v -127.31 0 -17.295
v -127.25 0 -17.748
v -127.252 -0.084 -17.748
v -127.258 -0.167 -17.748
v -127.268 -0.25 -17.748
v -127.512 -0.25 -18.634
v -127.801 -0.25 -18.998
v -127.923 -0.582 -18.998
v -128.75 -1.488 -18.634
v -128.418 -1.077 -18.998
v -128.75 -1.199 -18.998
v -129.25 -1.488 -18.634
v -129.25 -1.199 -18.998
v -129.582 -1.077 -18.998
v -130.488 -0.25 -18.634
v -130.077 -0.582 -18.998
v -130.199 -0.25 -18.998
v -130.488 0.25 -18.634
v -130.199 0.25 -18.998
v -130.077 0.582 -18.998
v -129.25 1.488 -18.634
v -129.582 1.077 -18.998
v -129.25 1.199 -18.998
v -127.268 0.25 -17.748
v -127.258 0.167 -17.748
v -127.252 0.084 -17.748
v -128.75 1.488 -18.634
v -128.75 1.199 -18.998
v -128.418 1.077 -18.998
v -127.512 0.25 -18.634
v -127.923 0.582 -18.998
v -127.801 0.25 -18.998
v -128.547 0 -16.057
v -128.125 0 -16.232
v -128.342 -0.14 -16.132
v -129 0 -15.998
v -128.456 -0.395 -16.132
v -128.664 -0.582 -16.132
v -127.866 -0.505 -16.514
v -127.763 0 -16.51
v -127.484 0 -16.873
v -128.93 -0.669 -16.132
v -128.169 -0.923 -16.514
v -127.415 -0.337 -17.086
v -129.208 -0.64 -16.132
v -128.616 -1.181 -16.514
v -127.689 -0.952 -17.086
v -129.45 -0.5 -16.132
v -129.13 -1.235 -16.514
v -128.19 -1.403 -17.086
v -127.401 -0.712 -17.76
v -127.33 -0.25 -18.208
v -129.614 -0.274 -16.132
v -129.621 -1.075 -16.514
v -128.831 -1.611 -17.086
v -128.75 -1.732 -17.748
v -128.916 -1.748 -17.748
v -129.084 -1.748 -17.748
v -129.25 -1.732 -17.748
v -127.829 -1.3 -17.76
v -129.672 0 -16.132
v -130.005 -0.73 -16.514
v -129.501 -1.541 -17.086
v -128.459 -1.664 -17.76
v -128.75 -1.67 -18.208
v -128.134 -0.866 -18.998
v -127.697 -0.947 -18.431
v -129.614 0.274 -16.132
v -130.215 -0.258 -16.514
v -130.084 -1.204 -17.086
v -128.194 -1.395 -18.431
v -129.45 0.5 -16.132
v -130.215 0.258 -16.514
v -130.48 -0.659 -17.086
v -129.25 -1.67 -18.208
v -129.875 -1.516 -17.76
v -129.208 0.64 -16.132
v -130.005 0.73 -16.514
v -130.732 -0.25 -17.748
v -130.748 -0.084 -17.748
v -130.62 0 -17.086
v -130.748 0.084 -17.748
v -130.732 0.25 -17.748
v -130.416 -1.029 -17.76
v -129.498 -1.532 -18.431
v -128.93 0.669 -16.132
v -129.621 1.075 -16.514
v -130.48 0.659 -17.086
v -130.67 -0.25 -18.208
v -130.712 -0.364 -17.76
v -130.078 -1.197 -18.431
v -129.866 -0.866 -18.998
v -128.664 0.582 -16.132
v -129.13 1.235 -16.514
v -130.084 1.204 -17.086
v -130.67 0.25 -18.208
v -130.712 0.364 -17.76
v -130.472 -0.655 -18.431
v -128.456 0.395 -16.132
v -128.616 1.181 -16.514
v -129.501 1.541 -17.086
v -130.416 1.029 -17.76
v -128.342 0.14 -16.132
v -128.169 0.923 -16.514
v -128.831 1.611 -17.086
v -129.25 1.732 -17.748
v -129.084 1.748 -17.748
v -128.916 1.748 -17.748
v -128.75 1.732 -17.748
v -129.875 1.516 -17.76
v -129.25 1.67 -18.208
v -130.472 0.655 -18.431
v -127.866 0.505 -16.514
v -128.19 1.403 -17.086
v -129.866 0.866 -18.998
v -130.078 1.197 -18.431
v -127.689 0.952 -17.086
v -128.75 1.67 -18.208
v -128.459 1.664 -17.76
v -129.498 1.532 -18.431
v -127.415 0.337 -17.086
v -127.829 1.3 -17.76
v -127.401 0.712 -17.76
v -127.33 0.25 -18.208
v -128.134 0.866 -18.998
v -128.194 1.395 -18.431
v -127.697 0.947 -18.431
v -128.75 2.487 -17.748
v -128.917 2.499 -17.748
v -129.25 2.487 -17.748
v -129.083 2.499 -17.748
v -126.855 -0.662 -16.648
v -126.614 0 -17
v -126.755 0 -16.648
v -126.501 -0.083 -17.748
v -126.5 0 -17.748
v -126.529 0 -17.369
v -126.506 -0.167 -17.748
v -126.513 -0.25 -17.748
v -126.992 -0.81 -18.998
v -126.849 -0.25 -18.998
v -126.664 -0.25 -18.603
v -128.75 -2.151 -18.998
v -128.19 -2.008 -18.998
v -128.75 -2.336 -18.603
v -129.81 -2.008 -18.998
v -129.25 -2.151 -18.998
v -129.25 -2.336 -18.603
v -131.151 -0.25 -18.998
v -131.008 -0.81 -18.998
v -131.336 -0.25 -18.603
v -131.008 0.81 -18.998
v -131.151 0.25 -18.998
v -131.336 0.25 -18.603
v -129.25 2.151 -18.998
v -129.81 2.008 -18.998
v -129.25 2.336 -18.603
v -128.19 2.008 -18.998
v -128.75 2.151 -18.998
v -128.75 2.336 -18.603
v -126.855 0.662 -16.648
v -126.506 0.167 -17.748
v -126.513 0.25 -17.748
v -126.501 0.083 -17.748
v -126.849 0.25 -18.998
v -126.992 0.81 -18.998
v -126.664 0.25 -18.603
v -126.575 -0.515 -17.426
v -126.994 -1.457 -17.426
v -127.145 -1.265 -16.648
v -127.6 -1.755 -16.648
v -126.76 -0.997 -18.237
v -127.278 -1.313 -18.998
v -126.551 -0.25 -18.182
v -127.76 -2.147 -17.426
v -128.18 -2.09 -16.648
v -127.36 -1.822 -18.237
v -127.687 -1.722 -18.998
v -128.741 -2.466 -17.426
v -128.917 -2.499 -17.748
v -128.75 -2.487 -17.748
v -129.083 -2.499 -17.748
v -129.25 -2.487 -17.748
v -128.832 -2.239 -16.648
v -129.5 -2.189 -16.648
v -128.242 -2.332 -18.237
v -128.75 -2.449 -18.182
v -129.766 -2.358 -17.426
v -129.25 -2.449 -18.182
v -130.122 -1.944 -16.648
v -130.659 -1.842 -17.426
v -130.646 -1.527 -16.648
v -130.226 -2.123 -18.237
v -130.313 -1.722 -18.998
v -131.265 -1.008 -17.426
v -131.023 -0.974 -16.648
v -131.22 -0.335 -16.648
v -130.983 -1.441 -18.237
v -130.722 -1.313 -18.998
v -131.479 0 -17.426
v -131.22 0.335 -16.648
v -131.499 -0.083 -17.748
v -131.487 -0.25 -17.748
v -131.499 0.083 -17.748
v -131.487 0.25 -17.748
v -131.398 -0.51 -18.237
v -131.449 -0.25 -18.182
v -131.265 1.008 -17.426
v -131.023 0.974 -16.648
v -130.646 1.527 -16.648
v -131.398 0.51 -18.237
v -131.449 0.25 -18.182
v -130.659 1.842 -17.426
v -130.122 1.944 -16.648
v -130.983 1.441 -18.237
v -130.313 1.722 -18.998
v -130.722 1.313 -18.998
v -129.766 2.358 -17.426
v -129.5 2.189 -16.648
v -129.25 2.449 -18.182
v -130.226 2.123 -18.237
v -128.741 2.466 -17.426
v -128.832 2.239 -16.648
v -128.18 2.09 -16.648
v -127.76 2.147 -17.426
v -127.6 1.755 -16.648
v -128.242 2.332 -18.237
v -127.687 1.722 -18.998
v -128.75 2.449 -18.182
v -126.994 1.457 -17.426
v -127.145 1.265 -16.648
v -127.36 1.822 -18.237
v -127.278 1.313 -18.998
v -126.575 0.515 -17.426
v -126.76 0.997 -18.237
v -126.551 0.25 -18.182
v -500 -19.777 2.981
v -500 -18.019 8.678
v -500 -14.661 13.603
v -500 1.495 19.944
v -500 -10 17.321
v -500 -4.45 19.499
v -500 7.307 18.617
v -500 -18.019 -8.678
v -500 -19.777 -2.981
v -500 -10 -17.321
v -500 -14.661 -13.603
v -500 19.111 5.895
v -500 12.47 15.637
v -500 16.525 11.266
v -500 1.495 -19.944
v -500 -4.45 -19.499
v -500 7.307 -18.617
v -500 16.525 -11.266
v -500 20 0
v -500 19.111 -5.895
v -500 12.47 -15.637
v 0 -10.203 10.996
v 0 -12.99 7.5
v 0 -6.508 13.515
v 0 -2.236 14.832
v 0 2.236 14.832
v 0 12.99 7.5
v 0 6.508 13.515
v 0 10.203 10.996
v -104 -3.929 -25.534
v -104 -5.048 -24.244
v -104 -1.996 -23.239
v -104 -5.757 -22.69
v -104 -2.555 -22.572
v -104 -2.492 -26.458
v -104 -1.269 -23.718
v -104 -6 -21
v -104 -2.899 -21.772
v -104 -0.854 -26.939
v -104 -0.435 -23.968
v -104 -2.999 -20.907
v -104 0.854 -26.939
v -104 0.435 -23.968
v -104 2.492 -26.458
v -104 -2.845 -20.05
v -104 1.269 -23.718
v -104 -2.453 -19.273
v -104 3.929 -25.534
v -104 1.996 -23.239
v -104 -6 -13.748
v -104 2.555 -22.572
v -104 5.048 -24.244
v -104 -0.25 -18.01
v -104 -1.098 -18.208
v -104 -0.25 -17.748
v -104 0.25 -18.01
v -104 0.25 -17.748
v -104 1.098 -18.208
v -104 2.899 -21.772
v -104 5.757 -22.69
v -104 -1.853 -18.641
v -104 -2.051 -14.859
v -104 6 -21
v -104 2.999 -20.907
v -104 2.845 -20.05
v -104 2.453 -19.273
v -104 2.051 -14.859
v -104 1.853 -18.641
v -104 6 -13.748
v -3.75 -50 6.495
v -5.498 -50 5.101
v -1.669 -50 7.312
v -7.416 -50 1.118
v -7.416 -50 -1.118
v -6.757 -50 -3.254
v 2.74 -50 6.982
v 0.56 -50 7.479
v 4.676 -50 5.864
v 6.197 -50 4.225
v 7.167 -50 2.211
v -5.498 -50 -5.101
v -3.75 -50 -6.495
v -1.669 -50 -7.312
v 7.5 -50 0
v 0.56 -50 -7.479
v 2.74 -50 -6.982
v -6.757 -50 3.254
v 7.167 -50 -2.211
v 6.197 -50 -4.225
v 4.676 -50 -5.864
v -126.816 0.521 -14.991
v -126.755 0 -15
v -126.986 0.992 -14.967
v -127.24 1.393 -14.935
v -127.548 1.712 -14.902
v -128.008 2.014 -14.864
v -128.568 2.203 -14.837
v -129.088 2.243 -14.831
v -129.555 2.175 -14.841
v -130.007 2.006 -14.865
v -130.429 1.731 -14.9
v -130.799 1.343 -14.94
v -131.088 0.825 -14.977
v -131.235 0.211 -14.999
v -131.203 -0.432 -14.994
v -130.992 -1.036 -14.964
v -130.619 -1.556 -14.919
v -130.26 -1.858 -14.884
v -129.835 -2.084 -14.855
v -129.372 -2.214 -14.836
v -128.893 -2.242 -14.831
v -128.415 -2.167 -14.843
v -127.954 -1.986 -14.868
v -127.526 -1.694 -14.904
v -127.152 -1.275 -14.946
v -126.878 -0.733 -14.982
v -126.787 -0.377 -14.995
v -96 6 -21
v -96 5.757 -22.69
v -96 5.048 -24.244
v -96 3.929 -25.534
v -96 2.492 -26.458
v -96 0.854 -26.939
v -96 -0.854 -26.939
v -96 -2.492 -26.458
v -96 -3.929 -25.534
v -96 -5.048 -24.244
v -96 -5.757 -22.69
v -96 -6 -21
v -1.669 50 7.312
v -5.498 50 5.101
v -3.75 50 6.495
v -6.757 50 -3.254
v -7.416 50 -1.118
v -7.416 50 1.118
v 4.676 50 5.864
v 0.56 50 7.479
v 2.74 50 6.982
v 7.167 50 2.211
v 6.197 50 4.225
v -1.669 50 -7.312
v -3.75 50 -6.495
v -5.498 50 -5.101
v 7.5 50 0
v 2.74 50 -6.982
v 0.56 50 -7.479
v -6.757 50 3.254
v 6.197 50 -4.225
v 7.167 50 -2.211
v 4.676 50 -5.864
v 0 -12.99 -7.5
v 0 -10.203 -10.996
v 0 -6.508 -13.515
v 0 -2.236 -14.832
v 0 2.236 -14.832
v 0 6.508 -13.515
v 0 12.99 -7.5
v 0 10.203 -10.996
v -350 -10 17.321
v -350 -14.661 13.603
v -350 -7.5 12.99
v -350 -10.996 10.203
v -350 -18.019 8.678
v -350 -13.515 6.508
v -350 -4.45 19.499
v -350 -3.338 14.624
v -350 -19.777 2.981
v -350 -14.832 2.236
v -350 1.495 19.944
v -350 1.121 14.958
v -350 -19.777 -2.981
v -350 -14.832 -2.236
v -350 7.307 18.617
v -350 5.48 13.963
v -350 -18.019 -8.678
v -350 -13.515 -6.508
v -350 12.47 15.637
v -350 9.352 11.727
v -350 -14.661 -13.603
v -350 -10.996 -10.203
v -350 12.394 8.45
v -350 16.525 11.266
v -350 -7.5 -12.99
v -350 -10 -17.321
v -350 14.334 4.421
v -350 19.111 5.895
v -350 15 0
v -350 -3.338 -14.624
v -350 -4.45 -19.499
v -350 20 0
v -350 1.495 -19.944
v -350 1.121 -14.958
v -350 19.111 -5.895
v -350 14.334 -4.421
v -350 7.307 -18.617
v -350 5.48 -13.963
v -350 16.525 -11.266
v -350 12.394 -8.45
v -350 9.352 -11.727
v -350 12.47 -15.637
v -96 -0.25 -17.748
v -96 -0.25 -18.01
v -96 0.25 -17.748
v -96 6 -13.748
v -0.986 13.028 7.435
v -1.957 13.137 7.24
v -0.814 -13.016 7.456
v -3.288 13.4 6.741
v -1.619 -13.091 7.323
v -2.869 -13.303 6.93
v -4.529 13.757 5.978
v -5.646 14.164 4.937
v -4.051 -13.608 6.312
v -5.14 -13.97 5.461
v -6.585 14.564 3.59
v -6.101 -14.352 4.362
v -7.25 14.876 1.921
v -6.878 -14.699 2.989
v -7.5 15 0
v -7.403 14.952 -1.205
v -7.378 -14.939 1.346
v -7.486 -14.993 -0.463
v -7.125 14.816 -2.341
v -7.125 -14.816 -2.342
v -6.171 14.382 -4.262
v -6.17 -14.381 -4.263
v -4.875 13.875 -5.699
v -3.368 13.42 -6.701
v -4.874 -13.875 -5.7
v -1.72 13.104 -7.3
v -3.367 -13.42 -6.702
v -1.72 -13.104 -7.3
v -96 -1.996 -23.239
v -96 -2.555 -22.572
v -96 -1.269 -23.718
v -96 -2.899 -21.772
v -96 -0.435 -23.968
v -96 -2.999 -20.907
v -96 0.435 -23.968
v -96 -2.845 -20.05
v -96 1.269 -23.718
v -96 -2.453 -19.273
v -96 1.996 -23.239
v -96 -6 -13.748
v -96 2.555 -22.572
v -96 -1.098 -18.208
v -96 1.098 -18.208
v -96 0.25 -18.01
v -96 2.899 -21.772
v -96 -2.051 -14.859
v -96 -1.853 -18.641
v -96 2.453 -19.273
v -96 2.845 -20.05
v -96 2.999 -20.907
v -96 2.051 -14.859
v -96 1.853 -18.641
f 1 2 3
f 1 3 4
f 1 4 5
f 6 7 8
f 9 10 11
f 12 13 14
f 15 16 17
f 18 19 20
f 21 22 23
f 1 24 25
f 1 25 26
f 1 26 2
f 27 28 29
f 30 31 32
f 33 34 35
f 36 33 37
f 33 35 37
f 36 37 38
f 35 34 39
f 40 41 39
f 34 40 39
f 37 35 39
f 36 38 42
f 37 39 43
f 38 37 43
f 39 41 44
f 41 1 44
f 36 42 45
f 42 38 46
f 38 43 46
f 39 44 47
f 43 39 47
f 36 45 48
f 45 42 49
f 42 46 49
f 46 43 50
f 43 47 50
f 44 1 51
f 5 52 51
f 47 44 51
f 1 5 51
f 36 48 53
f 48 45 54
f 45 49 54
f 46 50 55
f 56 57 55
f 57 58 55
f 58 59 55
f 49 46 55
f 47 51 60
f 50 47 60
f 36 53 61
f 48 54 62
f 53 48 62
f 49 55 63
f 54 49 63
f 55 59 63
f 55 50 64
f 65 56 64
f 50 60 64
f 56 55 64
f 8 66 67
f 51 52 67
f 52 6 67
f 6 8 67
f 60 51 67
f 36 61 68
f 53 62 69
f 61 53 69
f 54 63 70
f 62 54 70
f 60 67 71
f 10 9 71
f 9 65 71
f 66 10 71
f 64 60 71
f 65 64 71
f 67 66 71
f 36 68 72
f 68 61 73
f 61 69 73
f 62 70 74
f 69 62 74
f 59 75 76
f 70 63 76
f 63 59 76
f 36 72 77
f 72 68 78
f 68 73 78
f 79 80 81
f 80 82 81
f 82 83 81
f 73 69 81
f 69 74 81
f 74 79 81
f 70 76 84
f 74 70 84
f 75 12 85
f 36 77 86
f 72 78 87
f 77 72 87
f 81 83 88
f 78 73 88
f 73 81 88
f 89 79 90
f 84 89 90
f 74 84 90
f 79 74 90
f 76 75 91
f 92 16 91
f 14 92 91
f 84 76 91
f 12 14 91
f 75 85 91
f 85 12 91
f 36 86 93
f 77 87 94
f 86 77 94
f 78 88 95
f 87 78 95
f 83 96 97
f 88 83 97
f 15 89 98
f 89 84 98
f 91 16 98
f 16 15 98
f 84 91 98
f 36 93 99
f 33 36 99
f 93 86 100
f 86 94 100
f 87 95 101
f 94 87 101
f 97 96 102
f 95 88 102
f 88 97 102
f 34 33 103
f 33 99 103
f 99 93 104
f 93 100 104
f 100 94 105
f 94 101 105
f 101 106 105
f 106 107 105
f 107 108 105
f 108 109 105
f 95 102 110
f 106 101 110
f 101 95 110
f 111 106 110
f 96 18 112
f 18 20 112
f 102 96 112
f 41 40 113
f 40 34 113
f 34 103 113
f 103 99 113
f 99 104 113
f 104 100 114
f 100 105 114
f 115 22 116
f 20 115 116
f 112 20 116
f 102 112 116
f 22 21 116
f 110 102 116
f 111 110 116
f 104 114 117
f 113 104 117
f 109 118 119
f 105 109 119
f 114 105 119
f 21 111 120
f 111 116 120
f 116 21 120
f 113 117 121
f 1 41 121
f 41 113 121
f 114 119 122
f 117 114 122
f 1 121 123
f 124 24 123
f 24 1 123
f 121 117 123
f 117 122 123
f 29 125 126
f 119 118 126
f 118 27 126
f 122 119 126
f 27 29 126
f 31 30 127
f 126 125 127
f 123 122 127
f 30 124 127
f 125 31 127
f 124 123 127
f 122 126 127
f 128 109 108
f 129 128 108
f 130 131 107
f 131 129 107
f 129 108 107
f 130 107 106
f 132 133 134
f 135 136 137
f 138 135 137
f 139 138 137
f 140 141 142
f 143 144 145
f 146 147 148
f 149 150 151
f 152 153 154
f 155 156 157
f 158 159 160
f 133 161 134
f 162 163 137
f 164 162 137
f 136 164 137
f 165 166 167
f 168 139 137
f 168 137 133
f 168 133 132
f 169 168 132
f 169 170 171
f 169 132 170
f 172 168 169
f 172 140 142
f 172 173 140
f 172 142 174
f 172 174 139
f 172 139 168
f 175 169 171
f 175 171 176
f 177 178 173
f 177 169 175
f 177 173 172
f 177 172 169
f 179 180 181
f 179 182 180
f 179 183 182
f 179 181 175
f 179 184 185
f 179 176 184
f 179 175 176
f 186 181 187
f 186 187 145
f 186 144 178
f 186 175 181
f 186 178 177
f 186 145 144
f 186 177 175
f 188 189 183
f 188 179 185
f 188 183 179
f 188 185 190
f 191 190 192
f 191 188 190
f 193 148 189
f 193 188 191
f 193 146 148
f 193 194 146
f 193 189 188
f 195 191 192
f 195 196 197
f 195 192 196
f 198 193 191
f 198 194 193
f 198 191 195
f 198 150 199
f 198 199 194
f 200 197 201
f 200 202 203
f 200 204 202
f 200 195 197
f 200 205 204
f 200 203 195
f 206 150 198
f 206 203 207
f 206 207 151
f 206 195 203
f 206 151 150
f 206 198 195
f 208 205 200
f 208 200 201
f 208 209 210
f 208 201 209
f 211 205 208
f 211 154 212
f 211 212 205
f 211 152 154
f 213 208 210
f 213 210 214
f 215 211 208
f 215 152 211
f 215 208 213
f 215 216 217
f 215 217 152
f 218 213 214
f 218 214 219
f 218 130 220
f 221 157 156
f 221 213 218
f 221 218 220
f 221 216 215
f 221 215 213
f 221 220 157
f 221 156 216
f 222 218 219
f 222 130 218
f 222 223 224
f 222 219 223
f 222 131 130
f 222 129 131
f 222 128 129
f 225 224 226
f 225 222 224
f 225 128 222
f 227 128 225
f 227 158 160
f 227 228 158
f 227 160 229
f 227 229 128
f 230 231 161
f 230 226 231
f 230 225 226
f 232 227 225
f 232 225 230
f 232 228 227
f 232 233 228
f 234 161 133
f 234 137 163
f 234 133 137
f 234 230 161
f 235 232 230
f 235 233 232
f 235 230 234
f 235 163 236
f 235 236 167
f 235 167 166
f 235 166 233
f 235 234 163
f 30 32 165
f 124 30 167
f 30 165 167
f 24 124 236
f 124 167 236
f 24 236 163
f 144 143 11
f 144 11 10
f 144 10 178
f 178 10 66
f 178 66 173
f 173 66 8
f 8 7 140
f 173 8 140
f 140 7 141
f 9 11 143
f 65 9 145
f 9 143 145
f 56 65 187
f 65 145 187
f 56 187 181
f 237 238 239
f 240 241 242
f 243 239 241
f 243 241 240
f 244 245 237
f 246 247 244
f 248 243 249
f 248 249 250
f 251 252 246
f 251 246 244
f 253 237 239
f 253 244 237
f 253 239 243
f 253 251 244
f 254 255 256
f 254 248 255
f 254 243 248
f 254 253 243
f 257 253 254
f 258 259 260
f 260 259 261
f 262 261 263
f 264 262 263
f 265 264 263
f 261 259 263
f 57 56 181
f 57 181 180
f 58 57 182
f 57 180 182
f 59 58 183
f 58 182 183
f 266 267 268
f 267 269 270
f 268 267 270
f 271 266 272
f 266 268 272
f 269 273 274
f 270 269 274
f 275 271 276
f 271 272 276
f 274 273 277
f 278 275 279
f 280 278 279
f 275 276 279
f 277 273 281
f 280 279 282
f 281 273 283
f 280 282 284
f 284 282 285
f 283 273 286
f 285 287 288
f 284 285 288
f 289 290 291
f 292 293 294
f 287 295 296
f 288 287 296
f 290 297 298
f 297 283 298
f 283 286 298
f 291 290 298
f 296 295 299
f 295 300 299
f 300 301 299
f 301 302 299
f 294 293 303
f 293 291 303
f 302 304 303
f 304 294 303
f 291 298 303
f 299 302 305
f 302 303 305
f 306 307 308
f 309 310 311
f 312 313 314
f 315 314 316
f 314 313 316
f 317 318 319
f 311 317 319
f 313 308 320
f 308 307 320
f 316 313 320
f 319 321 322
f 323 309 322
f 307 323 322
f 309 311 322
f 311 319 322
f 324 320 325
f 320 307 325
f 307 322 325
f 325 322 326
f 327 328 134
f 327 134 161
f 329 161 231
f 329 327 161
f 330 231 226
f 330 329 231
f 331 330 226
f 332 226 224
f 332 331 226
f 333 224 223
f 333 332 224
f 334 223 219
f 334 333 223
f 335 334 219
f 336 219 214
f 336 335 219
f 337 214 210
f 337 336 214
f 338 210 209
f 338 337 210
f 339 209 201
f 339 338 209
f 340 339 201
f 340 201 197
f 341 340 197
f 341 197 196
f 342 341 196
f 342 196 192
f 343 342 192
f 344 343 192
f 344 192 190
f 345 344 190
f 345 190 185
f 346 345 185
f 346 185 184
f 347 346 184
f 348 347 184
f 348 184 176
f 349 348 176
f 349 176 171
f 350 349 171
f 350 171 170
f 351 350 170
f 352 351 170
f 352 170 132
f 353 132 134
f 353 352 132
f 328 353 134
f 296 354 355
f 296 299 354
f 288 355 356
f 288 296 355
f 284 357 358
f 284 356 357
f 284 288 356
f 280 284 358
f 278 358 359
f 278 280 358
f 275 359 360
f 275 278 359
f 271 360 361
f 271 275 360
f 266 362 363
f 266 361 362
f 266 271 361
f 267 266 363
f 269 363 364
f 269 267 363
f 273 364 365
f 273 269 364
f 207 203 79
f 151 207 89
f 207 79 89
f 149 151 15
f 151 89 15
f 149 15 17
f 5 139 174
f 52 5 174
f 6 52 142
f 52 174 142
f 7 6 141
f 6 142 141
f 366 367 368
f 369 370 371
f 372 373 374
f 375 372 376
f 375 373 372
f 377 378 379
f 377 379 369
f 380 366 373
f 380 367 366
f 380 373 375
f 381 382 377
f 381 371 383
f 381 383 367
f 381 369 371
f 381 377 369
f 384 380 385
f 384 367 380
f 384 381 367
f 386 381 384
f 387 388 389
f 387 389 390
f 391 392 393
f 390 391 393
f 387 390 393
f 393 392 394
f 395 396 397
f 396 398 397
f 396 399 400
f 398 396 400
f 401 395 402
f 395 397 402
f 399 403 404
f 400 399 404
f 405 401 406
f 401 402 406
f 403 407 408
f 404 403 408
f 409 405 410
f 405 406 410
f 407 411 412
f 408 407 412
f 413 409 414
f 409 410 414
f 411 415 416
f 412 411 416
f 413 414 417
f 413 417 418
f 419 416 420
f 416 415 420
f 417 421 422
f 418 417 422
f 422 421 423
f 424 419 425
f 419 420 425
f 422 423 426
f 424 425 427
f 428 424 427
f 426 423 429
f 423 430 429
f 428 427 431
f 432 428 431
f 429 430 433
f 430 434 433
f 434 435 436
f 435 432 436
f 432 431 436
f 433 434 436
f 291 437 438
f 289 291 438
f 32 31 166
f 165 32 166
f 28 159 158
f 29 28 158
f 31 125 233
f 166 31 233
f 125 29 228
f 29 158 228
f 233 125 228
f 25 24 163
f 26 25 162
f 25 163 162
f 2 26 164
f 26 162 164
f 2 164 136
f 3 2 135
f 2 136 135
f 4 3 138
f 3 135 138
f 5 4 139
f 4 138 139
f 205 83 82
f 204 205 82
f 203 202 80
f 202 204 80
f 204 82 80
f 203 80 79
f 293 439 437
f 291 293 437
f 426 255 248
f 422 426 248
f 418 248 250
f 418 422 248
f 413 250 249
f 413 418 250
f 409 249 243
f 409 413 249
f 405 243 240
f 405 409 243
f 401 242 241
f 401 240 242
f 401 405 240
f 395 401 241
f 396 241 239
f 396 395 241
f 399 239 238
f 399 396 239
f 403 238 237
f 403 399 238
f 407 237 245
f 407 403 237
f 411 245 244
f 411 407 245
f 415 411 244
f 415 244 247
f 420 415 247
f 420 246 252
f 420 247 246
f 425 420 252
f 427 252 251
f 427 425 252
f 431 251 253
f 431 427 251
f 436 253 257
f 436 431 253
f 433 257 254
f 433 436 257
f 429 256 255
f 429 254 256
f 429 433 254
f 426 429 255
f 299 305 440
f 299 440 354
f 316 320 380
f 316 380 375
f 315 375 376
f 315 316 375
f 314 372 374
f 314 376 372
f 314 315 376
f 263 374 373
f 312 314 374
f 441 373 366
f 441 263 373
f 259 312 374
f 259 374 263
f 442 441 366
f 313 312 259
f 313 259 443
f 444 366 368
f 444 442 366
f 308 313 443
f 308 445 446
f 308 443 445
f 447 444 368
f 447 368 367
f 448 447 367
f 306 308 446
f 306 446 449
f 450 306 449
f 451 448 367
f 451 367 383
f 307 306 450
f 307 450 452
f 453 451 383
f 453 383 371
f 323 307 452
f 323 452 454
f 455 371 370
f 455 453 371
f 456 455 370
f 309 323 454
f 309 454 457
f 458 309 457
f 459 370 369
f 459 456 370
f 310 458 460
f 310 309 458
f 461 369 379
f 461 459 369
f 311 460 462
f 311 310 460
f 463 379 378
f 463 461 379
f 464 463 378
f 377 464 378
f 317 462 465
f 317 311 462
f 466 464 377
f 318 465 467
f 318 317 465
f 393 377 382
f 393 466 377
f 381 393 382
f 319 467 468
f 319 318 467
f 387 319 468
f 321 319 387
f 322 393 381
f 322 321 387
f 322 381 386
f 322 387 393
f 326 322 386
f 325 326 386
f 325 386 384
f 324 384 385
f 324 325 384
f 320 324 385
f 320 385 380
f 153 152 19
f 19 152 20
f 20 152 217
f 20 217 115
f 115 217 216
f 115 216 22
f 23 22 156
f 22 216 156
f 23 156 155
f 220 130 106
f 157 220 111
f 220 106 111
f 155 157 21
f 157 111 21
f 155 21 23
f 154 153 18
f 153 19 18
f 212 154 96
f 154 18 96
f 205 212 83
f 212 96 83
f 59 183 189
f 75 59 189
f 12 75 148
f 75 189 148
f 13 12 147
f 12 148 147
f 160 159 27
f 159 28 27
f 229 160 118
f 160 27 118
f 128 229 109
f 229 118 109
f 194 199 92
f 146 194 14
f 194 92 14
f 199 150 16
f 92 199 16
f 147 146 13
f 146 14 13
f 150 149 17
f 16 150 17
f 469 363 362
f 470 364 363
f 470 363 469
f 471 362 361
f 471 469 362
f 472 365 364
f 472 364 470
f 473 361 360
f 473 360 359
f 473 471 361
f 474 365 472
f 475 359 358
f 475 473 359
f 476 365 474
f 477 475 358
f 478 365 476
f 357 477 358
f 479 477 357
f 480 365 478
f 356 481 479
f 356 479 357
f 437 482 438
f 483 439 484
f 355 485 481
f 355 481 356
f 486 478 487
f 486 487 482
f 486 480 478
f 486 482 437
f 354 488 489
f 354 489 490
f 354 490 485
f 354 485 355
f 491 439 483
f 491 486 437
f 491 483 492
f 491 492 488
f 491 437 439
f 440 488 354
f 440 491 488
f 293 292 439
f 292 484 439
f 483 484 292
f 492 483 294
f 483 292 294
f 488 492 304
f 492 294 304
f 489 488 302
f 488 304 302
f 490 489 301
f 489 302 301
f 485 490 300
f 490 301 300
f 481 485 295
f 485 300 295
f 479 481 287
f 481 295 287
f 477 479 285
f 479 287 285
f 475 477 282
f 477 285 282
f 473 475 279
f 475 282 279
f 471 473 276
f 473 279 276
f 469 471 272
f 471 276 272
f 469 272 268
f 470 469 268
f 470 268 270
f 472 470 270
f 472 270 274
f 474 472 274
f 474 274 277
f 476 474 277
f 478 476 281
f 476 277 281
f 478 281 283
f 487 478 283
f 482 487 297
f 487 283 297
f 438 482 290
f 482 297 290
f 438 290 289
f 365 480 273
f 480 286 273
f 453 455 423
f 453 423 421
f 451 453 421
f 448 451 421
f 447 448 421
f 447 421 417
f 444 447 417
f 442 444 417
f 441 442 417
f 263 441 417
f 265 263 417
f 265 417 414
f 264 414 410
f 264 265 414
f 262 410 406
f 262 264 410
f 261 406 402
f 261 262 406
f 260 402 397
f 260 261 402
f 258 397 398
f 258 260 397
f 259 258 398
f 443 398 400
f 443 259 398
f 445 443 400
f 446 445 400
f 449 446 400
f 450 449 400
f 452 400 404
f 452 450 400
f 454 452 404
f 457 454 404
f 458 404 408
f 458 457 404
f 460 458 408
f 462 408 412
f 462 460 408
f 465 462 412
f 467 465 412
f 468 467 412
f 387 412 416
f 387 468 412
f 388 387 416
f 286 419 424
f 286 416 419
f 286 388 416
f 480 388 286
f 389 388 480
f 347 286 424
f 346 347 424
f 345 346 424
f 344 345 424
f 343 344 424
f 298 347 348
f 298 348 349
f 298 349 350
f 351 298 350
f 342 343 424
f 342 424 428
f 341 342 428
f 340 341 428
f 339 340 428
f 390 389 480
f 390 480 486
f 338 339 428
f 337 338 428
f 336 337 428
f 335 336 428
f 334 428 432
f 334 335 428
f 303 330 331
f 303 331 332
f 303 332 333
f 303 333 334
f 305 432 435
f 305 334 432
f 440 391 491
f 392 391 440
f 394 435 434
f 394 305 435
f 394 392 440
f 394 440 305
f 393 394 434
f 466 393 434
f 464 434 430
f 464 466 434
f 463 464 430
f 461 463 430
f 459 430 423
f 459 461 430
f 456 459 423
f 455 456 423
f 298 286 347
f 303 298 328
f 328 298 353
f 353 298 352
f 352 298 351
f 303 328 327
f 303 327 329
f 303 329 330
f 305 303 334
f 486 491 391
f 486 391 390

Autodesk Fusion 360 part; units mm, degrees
sketch "Szkic1" plane through (0, 0, 0) normal (0, 0, 1) x (1, 0, 0)
  line L0 (0, 0) -> (-85, 0)
  line L1 (-500, 0) -> (-500, 20)
  line L2 (-500, 20) -> (-350, 20)
  line L3 (-350, 20) -> (-350, 15)
  line L4 (-350, 15) -> (0, 15)
  line L5 (0, 15) -> (0, 0)
  line L6 (0, 0) -> (-500, 0)
  dimension "d1" = 150
  dimension "d2" = 20
  dimension "d3" = 15
  dimension "d4" = 500
revolve "Obrót1" add sketch "Szkic1" angle 360 about axis through (0, 0, 0) along (-1, 0, 0)
ref_plane "Płaszczyzna konstrukcyjna1" through (-100, 0, 0) normal (1, 0, 0) x (0, 1, 0)
sketch "Szkic3" plane through (-100, 0, 0) normal (1, 0, 0) x (0, 1, 0)
  line L0 (6, -13.7477) -> (-6, -13.7477)
  line L1 (-6, -13.7477) -> (-6, -21)
  line L2 (6, -13.7477) -> (6, -21)
  arc A0 (-6, -21) -> (6, -21) centre (0, -21) ccw
  circle A1 centre (0, -21) radius 3
  line L3 (0, 0) -> (0, -45) construction
  circle A2 centre (0, -21) radius 6 construction
  circle A3 centre (0, 0) radius 15
  dimension "d8" = 6
  dimension "d9" = 6
extrude "Wyciągnięcie proste1" add sketch "Szkic3" along normal mid plane 8 contours L1 L2 A0 A3
sketch "Szkic4" plane through (0, 0, 0) normal (0, 1, 0) x (1, 0, 0)
  circle A0 centre (0, 0) radius 7.5
  dimension "d12" = 15
extrude "Wyciągnięcie proste2" add sketch "Szkic4" along normal mid plane 100
sketch "Szkic5" plane through (0, 0, 0) normal (0, 1, 0) x (1, 0, 0)
  circle A0 centre (-129, 17.7477) radius 2.5
  line L0 (-122.0795, 13.7477) -> (-137.0795, 13.7477) construction
  line L1 (-104, 13.7477) -> (-96, 13.7477)
  line L2 (-131.245, 16.6477) -> (-131.245, 13.7477)
  line L3 (-126.755, 16.6477) -> (-126.755, 13.7477)
  line L4 (-129, 20.2477) -> (-129, 12.8729)
  line L5 (-126.755, 13.7477) -> (-129, 13.7477)
  line L6 (-131.1651, 18.9977) -> (-126.8349, 18.9977)
  line L7 (-129.25, 18.9977) -> (-128.75, 18.9977)
  line L8 (-128.75, 18.9977) -> (-128.75, 17.7477)
  line L9 (-128.75, 17.7477) -> (-129.25, 17.7477)
  line L10 (-129.25, 17.7477) -> (-129.25, 18.9977)
  circle A1 centre (-129, 17.7477) radius 1.75
  dimension "d16" = 5
  dimension "d17" = 4
  dimension "d19" = 25
  dimension "d20" = 1.1
  dimension "d23" = 0.5
  dimension "d25" = 3.5
  dimension "d26" = 1.25
revolve "Obrót2" add sketch "Szkic5" angle 360 about axis through (-129, 0, -20.2477) along (0, 0, 1) contours A0 L4 L6 A1 | A0 L3 L4 L5 picked at (-127.0708, 16.5986)
extrude "Wyciągnięcie proste3" cut sketch "Szkic5" along normal through all and the other way through all contours L4 L6 L7 L8 L9 | L4 L6 L7 L9 L10
pattern_circular "Szyk kołowy1" count 2 over 90 about axis through (-129, 0, -20.2477) along (0, 0, 1) of "Wyciągnięcie proste3"
equation "pull_l = 100 mm"
